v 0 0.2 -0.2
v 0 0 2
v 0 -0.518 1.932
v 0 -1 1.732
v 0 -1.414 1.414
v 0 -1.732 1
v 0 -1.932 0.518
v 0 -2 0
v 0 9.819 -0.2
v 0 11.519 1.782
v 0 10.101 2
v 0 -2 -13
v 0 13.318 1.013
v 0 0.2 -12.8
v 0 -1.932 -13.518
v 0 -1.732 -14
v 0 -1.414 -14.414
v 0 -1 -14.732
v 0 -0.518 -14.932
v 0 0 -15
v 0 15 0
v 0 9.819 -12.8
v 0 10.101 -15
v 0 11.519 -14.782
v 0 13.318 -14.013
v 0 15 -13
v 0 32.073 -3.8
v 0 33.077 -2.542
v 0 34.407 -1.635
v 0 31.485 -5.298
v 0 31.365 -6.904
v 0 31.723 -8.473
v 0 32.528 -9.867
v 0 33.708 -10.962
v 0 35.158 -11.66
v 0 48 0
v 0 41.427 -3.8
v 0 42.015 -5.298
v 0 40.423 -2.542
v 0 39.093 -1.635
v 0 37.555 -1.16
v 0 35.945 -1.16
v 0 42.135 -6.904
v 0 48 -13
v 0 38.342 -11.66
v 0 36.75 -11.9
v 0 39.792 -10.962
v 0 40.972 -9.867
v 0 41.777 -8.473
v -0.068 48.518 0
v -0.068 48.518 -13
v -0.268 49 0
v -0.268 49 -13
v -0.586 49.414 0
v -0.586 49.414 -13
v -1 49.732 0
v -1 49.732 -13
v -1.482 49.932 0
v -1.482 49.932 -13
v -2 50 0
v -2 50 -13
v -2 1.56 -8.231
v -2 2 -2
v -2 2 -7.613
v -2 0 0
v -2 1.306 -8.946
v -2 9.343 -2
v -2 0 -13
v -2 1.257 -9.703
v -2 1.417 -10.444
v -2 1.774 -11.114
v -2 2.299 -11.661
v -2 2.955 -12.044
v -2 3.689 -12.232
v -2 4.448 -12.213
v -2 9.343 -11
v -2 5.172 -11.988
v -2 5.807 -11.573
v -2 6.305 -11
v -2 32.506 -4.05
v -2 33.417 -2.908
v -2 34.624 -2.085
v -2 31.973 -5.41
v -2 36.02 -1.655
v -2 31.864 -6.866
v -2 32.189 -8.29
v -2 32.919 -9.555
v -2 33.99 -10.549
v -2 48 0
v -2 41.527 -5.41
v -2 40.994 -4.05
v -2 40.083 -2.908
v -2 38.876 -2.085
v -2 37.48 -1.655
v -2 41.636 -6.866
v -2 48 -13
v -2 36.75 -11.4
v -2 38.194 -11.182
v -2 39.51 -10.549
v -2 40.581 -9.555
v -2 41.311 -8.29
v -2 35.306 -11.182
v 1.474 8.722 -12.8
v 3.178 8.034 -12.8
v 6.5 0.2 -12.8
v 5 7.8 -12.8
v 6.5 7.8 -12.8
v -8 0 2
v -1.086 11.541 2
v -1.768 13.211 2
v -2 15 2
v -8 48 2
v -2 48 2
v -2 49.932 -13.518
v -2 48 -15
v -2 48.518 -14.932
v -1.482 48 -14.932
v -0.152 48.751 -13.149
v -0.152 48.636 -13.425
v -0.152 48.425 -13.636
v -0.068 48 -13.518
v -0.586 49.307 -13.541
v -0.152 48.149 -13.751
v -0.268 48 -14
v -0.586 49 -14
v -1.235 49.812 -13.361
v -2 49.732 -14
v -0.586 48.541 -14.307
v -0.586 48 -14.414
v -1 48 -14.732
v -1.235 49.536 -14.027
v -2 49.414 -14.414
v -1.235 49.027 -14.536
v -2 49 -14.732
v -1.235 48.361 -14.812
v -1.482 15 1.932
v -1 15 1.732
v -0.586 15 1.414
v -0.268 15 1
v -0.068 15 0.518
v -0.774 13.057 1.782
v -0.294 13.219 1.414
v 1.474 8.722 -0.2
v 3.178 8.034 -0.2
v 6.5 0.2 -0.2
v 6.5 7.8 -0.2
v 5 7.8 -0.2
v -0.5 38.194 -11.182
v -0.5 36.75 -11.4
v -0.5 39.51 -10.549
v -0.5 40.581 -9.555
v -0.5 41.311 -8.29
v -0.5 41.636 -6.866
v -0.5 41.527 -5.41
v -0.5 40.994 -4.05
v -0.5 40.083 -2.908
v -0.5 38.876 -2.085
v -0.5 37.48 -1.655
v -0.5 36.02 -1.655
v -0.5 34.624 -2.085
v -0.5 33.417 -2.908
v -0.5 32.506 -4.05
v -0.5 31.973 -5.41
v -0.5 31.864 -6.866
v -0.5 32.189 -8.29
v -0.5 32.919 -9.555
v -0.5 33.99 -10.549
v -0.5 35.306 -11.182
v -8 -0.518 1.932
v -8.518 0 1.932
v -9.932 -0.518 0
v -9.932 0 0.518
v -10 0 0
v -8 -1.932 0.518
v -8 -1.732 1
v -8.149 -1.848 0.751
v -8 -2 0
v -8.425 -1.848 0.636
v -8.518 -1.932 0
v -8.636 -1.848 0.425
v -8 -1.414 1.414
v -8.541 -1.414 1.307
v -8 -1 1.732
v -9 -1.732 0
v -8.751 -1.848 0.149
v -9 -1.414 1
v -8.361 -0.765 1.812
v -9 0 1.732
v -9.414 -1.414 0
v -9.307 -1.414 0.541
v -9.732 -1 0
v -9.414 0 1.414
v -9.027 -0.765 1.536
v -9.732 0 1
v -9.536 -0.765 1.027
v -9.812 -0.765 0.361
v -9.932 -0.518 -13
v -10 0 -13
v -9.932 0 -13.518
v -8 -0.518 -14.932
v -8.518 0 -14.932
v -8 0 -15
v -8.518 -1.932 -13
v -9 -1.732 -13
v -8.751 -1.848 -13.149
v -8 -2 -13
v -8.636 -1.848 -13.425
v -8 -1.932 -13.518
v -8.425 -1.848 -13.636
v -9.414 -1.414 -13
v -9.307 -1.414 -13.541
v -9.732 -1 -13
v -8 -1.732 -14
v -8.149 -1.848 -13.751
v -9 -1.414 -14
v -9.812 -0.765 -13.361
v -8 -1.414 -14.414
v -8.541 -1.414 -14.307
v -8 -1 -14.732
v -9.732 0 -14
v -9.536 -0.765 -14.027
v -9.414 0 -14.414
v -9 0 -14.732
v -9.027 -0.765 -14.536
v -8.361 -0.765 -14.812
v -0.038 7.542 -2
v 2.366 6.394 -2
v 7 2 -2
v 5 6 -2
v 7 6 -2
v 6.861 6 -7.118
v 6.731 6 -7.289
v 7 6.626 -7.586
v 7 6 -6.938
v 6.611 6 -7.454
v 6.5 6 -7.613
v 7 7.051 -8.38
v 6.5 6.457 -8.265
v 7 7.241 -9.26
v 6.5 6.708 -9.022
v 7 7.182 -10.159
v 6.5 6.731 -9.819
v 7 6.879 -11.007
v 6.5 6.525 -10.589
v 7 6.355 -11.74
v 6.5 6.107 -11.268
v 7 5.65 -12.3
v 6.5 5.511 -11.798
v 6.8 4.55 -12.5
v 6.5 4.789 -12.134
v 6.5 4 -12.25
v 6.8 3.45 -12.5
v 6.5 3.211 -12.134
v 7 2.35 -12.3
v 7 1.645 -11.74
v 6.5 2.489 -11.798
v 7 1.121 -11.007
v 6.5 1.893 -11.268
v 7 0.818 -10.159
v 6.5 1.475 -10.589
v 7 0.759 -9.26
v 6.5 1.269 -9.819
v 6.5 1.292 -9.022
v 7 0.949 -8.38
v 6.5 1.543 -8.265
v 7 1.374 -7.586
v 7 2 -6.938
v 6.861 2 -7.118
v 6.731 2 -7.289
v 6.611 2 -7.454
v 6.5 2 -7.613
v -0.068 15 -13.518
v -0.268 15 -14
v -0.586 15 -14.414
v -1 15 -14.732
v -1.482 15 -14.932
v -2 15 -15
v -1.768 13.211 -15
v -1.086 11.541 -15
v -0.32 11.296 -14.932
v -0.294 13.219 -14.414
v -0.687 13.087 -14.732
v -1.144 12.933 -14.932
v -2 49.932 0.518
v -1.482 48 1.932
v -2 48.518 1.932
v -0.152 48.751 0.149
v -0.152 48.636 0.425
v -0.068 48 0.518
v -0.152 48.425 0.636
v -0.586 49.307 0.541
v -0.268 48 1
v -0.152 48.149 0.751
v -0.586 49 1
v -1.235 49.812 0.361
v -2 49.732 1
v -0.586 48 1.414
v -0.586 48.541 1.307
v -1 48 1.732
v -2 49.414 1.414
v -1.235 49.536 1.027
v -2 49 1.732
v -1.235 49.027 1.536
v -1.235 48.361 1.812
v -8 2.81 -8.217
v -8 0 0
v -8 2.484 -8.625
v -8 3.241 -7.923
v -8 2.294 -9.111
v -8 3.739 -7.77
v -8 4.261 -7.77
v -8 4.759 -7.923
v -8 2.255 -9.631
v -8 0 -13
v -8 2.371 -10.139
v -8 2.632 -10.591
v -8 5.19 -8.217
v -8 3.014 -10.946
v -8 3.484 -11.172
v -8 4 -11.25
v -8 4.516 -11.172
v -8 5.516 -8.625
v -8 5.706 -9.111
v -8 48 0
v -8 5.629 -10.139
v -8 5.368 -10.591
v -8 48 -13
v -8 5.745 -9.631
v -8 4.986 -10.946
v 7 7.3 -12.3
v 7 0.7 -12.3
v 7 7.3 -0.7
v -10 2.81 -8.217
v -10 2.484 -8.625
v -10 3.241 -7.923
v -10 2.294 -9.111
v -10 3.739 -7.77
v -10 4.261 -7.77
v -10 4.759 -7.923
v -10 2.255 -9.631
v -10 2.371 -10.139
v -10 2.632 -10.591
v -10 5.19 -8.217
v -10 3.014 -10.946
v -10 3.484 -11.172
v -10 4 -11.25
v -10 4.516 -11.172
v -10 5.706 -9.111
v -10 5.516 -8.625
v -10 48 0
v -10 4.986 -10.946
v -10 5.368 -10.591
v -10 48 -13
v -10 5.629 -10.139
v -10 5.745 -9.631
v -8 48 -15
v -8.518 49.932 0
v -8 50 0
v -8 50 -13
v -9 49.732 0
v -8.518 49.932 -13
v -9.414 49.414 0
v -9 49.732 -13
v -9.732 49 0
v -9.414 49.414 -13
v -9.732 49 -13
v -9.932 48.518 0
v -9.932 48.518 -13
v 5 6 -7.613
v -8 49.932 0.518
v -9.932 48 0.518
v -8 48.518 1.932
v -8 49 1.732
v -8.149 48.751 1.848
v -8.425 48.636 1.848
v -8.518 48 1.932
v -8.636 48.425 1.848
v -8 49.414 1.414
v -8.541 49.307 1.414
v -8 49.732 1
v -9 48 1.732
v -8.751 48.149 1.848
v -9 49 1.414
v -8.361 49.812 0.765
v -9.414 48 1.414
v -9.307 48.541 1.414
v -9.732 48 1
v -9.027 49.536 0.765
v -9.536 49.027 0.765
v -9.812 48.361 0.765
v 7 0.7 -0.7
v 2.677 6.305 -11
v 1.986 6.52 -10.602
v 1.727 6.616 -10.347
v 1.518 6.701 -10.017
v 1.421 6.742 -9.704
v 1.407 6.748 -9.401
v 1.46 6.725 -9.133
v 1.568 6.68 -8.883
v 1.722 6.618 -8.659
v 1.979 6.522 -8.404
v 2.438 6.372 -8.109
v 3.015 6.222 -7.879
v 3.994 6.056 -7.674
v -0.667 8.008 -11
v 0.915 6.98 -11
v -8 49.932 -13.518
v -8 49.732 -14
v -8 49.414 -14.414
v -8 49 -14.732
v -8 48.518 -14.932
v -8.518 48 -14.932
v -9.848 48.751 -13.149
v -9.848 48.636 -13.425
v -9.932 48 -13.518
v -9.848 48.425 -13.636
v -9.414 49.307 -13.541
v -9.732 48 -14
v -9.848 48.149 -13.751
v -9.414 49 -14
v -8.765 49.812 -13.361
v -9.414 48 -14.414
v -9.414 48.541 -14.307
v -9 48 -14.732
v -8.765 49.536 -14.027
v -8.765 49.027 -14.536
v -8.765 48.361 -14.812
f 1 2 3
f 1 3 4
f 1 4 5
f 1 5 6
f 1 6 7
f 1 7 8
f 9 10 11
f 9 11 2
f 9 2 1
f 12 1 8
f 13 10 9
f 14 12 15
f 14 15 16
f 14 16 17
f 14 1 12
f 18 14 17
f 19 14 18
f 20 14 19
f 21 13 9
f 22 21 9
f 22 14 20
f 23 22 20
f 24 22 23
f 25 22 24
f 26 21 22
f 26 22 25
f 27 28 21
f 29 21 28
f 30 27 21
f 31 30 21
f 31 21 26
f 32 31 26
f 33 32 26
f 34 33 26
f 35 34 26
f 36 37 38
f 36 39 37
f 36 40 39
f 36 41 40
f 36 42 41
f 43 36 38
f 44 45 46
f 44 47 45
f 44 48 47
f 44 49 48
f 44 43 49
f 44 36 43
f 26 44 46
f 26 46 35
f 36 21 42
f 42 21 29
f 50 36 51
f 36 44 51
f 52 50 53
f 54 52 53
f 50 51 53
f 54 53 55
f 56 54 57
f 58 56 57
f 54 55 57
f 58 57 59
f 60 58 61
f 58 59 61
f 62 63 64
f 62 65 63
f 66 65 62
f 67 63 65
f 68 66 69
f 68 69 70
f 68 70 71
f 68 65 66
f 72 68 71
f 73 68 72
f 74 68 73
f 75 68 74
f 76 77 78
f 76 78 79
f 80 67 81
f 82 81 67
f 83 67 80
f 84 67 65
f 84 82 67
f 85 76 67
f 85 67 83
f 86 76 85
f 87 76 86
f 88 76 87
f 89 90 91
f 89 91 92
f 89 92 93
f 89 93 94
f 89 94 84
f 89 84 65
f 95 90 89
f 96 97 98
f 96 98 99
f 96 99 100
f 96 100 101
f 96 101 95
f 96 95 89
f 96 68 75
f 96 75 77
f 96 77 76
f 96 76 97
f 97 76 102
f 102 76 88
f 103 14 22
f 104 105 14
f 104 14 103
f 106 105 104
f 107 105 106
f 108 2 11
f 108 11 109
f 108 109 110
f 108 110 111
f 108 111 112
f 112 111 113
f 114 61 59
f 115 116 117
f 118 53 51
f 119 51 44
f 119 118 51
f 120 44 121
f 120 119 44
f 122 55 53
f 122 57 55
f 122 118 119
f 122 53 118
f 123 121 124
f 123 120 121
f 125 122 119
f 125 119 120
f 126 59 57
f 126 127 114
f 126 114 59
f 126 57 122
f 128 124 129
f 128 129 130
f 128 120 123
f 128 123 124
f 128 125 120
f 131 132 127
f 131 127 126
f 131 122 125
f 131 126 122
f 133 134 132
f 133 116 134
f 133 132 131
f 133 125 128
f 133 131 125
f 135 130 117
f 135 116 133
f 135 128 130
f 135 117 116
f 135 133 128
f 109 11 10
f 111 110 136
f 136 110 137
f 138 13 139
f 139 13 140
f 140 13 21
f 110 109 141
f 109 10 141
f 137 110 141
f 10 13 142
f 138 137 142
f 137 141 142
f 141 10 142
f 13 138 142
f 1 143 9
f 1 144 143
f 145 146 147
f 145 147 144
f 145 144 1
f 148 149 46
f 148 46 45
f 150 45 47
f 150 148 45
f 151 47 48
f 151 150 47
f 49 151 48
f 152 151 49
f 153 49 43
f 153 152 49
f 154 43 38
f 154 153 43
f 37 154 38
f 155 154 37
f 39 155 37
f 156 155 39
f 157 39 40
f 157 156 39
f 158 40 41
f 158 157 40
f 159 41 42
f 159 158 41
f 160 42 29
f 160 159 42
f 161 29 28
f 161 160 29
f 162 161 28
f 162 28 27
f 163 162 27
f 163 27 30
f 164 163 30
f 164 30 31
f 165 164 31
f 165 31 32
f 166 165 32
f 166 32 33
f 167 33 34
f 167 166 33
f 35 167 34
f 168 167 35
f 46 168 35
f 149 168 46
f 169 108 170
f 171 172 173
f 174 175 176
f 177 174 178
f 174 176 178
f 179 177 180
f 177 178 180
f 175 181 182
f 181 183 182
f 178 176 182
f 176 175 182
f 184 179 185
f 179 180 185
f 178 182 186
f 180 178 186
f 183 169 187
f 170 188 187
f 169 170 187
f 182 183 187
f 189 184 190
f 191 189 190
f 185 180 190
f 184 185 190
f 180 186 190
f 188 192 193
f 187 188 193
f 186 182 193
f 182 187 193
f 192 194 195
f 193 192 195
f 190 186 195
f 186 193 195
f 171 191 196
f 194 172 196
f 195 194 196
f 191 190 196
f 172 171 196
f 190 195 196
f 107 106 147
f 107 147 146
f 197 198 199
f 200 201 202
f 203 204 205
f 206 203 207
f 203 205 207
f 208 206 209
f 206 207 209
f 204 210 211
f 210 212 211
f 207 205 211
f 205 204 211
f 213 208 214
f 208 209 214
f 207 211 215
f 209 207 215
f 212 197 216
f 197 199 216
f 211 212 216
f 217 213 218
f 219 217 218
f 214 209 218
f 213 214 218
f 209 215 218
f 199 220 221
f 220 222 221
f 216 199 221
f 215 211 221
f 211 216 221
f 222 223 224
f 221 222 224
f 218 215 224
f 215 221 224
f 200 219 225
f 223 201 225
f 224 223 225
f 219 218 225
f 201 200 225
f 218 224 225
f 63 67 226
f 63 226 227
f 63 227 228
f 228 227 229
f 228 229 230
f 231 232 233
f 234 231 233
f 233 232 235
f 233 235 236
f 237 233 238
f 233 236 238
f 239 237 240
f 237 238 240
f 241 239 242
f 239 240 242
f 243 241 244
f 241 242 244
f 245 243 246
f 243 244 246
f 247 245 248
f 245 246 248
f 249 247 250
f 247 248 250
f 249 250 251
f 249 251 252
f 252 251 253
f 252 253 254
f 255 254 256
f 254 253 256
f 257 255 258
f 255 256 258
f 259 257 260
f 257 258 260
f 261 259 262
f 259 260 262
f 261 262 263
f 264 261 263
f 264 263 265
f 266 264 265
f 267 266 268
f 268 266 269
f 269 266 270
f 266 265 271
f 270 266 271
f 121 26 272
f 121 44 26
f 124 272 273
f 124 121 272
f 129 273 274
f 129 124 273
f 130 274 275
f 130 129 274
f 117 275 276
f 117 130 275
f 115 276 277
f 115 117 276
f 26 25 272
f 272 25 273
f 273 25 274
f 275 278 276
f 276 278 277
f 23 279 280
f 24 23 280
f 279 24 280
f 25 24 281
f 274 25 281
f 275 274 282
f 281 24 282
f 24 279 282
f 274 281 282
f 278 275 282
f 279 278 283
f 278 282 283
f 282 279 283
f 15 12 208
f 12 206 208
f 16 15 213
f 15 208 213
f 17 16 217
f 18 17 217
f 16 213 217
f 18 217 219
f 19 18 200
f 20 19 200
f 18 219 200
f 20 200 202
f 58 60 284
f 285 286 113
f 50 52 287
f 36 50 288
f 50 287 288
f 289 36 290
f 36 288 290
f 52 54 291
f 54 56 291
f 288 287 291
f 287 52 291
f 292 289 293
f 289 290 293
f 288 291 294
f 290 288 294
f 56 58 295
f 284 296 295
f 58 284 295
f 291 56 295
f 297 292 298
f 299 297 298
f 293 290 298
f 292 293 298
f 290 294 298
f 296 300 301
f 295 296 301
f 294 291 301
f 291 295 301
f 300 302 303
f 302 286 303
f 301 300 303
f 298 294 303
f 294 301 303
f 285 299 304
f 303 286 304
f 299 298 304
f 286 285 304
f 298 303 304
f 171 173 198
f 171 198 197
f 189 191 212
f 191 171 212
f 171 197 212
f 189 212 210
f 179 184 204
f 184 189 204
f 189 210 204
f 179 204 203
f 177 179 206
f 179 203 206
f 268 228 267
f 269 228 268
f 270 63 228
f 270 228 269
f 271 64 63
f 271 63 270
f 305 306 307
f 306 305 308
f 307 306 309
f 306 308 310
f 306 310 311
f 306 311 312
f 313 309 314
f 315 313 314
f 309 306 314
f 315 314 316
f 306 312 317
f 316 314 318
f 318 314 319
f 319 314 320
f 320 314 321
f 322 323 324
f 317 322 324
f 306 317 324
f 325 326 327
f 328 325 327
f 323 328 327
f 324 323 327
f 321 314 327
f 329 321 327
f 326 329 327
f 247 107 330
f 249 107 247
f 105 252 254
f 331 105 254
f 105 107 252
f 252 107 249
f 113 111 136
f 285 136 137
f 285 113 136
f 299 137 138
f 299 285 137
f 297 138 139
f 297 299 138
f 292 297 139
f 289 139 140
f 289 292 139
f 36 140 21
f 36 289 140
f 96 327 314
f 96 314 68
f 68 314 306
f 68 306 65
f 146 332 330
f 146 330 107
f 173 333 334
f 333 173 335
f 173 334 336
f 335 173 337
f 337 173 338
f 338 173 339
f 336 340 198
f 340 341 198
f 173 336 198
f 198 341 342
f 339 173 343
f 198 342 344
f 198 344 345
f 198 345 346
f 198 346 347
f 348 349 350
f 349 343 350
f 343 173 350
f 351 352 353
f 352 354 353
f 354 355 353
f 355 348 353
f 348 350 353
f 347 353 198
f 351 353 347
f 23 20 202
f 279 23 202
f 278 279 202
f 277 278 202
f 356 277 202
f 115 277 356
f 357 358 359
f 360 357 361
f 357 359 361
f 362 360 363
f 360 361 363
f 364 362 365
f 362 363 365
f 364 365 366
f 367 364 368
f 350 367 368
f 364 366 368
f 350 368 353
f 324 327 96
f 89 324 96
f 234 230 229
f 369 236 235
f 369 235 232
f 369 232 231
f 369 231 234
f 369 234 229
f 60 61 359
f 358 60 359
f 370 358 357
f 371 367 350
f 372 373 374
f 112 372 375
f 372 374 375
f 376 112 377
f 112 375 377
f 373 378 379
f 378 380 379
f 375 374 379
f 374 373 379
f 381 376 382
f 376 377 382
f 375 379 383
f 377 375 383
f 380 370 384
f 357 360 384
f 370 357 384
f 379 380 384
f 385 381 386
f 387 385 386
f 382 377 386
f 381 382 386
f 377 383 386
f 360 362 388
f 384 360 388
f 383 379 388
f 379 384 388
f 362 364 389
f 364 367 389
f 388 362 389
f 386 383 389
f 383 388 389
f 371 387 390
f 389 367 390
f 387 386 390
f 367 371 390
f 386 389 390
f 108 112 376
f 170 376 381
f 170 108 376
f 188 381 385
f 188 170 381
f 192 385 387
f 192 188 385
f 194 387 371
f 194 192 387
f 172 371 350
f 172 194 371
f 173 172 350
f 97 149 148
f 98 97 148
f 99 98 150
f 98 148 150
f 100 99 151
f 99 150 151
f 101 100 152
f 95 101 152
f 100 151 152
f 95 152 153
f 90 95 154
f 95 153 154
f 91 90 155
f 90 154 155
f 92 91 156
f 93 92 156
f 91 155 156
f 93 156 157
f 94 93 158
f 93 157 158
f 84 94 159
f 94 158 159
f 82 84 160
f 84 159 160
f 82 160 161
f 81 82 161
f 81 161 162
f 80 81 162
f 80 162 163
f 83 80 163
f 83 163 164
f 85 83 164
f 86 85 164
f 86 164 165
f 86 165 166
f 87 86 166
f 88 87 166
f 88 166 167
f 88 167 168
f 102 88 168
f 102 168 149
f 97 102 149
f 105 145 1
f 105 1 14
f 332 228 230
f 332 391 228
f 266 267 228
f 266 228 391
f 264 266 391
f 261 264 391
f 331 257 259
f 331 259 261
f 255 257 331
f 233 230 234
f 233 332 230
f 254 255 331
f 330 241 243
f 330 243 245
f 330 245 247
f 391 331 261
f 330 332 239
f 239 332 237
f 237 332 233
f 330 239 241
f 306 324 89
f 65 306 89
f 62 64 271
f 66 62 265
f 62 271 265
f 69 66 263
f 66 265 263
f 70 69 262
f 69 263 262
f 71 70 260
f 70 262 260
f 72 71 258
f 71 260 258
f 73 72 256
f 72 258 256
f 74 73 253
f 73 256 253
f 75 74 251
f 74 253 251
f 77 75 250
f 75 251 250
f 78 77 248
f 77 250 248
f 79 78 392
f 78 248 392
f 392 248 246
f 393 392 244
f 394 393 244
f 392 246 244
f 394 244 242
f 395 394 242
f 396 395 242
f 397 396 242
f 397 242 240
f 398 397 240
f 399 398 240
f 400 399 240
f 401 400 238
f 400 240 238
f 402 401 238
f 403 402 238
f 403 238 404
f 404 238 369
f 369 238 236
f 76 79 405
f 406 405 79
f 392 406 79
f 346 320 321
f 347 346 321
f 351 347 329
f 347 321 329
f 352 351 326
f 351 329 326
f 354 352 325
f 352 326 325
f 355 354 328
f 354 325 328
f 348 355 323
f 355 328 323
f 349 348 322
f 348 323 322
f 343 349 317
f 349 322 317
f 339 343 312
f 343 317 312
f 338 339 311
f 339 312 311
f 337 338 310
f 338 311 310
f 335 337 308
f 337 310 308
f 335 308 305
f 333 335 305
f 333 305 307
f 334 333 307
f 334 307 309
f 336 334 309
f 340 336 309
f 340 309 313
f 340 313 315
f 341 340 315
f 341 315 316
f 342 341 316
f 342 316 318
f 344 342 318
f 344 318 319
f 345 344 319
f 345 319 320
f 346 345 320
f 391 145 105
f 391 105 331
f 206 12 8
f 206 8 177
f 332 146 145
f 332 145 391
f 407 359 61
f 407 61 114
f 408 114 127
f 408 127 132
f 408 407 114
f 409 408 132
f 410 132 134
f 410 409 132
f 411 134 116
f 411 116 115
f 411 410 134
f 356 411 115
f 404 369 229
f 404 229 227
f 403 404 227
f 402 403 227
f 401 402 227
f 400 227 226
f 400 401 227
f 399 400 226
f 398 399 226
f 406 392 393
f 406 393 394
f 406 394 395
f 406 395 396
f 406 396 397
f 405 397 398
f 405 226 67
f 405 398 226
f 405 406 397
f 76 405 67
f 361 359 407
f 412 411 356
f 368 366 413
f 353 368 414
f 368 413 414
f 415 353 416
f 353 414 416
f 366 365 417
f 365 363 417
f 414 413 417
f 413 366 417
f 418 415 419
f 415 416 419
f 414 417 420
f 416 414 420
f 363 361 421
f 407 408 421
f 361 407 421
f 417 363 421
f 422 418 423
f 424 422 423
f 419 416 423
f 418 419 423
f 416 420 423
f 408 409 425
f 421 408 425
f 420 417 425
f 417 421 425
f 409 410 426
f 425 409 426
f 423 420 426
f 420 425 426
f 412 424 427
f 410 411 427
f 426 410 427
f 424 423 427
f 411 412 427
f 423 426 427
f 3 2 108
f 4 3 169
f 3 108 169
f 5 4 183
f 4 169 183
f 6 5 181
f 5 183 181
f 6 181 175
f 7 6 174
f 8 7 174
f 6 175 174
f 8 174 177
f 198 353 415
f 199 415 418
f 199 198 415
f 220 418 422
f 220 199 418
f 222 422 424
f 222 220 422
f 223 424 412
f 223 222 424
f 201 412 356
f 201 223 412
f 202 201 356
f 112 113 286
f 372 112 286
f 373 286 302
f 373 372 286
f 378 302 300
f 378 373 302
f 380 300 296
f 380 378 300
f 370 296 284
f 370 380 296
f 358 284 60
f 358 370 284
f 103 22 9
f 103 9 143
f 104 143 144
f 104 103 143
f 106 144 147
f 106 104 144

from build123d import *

# Parameters (mm, degrees)
SKETCH1_W                = 13
SKETCH1_H                = 8
BOSS_EXTRUDE1_DEPTH      = 7
BOSS_EXTRUDE2_DEPTH      = 2
BOSS_EXTRUDE2_DEPTH_BACK = 50
SKETCH2_W                = 10
SKETCH2_H                = 17
BOSS_EXTRUDE3_REACH      = 56.9
SKETCH3_W                = 17
SKETCH3_H                = 2
FILLET4_R                = 5
FILLET3_R                = 2
SKETCH4_W                = 17
SKETCH4_H                = 7
CUT_EXTRUDE1_DEPTH       = 7
BOSS_EXTRUDE4_DEPTH      = 13
SHELL1_START             = -13
SHELL1_OUTLINE_W         = 6
SHELL1_OUTLINE_H         = 48
SHELL1_DEPTH             = 13
SHELL1_START_2           = -11
SHELL1_2_DEPTH           = 9
CUT_EXTRUDE2_REACH       = 55.151
SKETCH6_R                = 4.9
CHAMFER1_SIZE            = 0.5
CUT_EXTRUDE3_REACH       = 56.9
SKETCH7_R                = 2.75
SKETCH8_R                = 1.75
CUT_EXTRUDE4_DEPTH       = 55.899908953
CUT_EXTRUDE5_REACH       = 56.9
CUT_EXTRUDE6_START       = -12.6
CUT_EXTRUDE6_DEPTH       = 12.6
CHAMFER2_SIZE            = 0.5


# Read off the part's stored shape, not the designer's step: Shell1
# Some blends are built 0.0001 mm under size
with BuildPart() as part:
    # Sketch1 → Boss-Extrude1 (new body)
    with BuildSketch(Plane(origin=(0, 0, 0), x_dir=(0, 0, -1), z_dir=(1, 0, 0))):
        with Locations((6.5, 4)):
            Rectangle(SKETCH1_W, SKETCH1_H)
    extrude(amount=BOSS_EXTRUDE1_DEPTH)

    # Sketch2 → Boss-Extrude2 (add, two sides: drawn at the far end of the back side and taken through both)
    with BuildSketch(Plane(origin=(0, 0, 0), x_dir=(-1, 0, 0), z_dir=(0, -1, 0)).offset(-BOSS_EXTRUDE2_DEPTH_BACK)):
        with Locations((5, 6.5)):
            Rectangle(SKETCH2_W, SKETCH2_H)
    extrude(amount=BOSS_EXTRUDE2_DEPTH + BOSS_EXTRUDE2_DEPTH_BACK)

    # Sketch3 → Boss-Extrude3 (add, up to next)
    with BuildSketch(Plane(origin=(7, 0, 0), x_dir=(0, 0, -1), z_dir=(1, 0, 0)), mode=Mode.PRIVATE) as boss_extrude3_sk1:
        with Locations((6.5, 9)):
            Rectangle(SKETCH3_W, SKETCH3_H)
    boss_extrude3_tool1 = extrude(boss_extrude3_sk1.sketch, amount=-BOSS_EXTRUDE3_REACH, mode=Mode.PRIVATE) - part.part
    add(boss_extrude3_tool1.solids().sort_by_distance((7, 9, -6.5))[0])

    # Fillet4
    fillet4_edges = [part.edges().sort_by_distance(p)[0] for p in [
        (0, 10, -6.5),
    ]]
    fillet(fillet4_edges, radius=FILLET4_R)

    # Fillet3
    fillet3_edges = [part.edges().sort_by_distance(p)[0] for p in [
        (-5, 50, -15),
        (-10, 50, -6.5),
        (-5, 50, 2),
        (0, 50, -6.5),
        (-10, 24, 2),
        (-5, -2, 2),
        (-10, 24, -15),
        (-10, -2, -6.5),
        (-5, -2, -15),
        (6, 10, -15),
        (1.464466094, 11.464466094, -15),
        (6, 10, 2),
        (1.464466094, 11.464466094, 2),
        (0, 32.5, -15),
        (0, 32.5, 2),
    ]]
    fillet(fillet3_edges, radius=FILLET3_R - 0.0001)  # a hair under: the kernel refuses the full size

    # Sketch4 → Cut-Extrude1 (cut)
    with BuildSketch(Plane(origin=(7, 0, 0), x_dir=(0, 0, -1), z_dir=(1, 0, 0))):
        with Locations((6.5, 11.5)):
            Rectangle(SKETCH4_W, SKETCH4_H)
    extrude(amount=-CUT_EXTRUDE1_DEPTH, mode=Mode.SUBTRACT)

    # Sketch5 → Boss-Extrude4 (add)
    with BuildSketch(Plane(origin=(0, 0, -13), x_dir=(-1, 0, 0), z_dir=(0, 0, -1))):
        with BuildLine():
            Line((0, 8), (-5, 8))
            ThreePointArc((-5, 8), (-2.288252998, 8.546595612), (0, 10.101020514))
            Line((0, 10.101020514), (0, 8))
        make_face()
    extrude(amount=-BOSS_EXTRUDE4_DEPTH)

    # Shell1 outline → Shell1 (cut)
    with BuildSketch(Plane.XY.offset(SHELL1_START)):
        with Locations((-5, 24)):
            Rectangle(SHELL1_OUTLINE_W, SHELL1_OUTLINE_H)
    extrude(amount=SHELL1_DEPTH, mode=Mode.SUBTRACT)

    # Shell1 2 outline → Shell1 2 (cut)
    with BuildSketch(Plane.XY.offset(SHELL1_START_2)):
        with BuildLine():
            Line((-2, 2), (7, 2))
            Line((7, 2), (7, 6))
            Line((7, 6), (5, 6))
            ThreePointArc((5, 6), (1.121320343, 6.878679656), (-2, 9.343145751))
            Line((-2, 9.343145751), (-2, 2))
        make_face()
    extrude(amount=SHELL1_2_DEPTH, mode=Mode.SUBTRACT)

    # Sketch6 → Cut-Extrude2 (cut, up to next)
    with BuildSketch(Plane(origin=(0, 0, 0), x_dir=(0, 0, -1), z_dir=(1, 0, 0)), mode=Mode.PRIVATE) as cut_extrude2_sk1:
        with Locations((6.5, 36.75)):
            Circle(SKETCH6_R)
    cut_extrude2_tool1 = extrude(cut_extrude2_sk1.sketch, amount=-CUT_EXTRUDE2_REACH, mode=Mode.PRIVATE) & part.part
    add(cut_extrude2_tool1.solids().sort_by_distance((0, 36.75, -6.5))[0], mode=Mode.SUBTRACT)

    # Chamfer1
    chamfer1_edges = [part.edges().sort_by_distance(p)[0] for p in [
        (0, 36.75, -1.6),
    ]]
    chamfer(chamfer1_edges, length=CHAMFER1_SIZE)

    # Cut-Extrude3: up to this face of the body (flat: up to its plane)
    cut_extrude3_end = Plane(part.part.faces().sort_by_distance((-8, 24, -6.5))[0])
    # Sketch7 → Cut-Extrude3 (cut, up to the picked face)
    with BuildSketch(Plane(origin=(7, 0, 0), x_dir=(0, 0, -1), z_dir=(1, 0, 0)), mode=Mode.PRIVATE) as cut_extrude3_sk1:
        with Locations((9.5, 4)):
            Circle(SKETCH7_R)
    cut_extrude3_tool1 = split(extrude(cut_extrude3_sk1.sketch, amount=-CUT_EXTRUDE3_REACH, mode=Mode.PRIVATE), bisect_by=cut_extrude3_end, keep=Keep.BOTH, mode=Mode.PRIVATE)
    add(cut_extrude3_tool1.solids().sort_by(Axis((7, 4, -9.5), (-1, 0, 0)))[0], mode=Mode.SUBTRACT)

    # Sketch8 → Cut-Extrude4 (cut, through all)
    with BuildSketch(Plane(origin=(7, 0, 0), x_dir=(0, 0, -1), z_dir=(1, 0, 0))):
        with Locations((9.5, 4)):
            Circle(SKETCH8_R)
    extrude(amount=-CUT_EXTRUDE4_DEPTH, mode=Mode.SUBTRACT)

    # Cut-Extrude5: up to this face of the body (flat: up to its plane)
    cut_extrude5_end = Plane(part.part.faces().sort_by_distance((0, 23.174375266, -6.49999999))[0])
    # Sketch9 → Cut-Extrude5 (cut, up to the picked face)
    with BuildSketch(Plane(origin=(7, 0, 0), x_dir=(0, 0, -1), z_dir=(1, 0, 0)), mode=Mode.PRIVATE) as cut_extrude5_sk1:
        Polygon((0, 10.101020514), (0.2, 10.101020514), (0.2, 0.2), (12.8, 0.2), (12.8, 10.101020514), (13, 10.101020514), (13, 0), (0, 0), align=None)
    cut_extrude5_tool1 = split(extrude(cut_extrude5_sk1.sketch, amount=-CUT_EXTRUDE5_REACH, mode=Mode.PRIVATE), bisect_by=cut_extrude5_end, keep=Keep.BOTH, mode=Mode.PRIVATE)
    add(cut_extrude5_tool1.solids().sort_by(Axis((7, 9.93639, -0.1), (-1, 0, 0)))[0], mode=Mode.SUBTRACT)

    # Sketch10 → Cut-Extrude6 (cut)
    with BuildSketch(Plane.XY.offset(-0.2).offset(CUT_EXTRUDE6_START)):
        with BuildLine():
            Line((7, 8), (5, 8))
            ThreePointArc((5, 8), (2.288252998, 8.546595612), (0, 10.101020514))
            Line((0, 10.101020514), (0, 9.819266461))
            ThreePointArc((0, 9.819266461), (2.303825069, 8.32387532), (5, 7.8))
            Line((5, 7.8), (7, 7.8))
            Line((7, 7.8), (7, 8))
        make_face()
    extrude(amount=CUT_EXTRUDE6_DEPTH, mode=Mode.SUBTRACT)

    # Chamfer2
    # the kernel refuses this chamfer: 0.5 mm, written as the material it takes off along each edge
    with BuildSketch(Plane(origin=(7, 4, -9.5), x_dir=(0, 0.33829869190957257, 0.9410387850945741), z_dir=(0, -0.9410387850945741, 0.33829869190957257))) as chamfer2_piece_1:
        Polygon((2.75 + CHAMFER2_SIZE, 0), (2.75, CHAMFER2_SIZE), (2.75, 0), align=None)
    revolve(axis=Axis((7, 4, -9.5), (-1, 0, 0)), revolution_arc=320.453489915, mode=Mode.SUBTRACT)
    with BuildSketch(Plane(origin=(7, 0.2, 1.085841494), x_dir=(-0.9996219169112968, -0.027495876610586403, 0), z_dir=(0, 0, -1))) as chamfer2_piece_2:
        Polygon((CHAMFER2_SIZE * 0.999621916911, CHAMFER2_SIZE * 0.0274958766106), (-CHAMFER2_SIZE * 0.0274958766106, CHAMFER2_SIZE * 0.999621916911), (0, 0), align=None)
    extrude(amount=15.171682988, mode=Mode.SUBTRACT)
    with BuildSketch(Plane(origin=(7, 9.085841494, -0.2), x_dir=(-0.9996219169112968, 0, 0.027495876610586403), z_dir=(0, -1, 0)), Plane(origin=(7, -1.085841494, -12.8), x_dir=(-0.9996219169112968, 0, -0.027495876610585647), z_dir=(0, 1, 0))) as chamfer2_piece_3:
        Polygon((CHAMFER2_SIZE * 0.999621916911, CHAMFER2_SIZE * 0.0274958766106), (-CHAMFER2_SIZE * 0.0274958766106, CHAMFER2_SIZE * 0.999621916911), (0, 0), align=None)
    extrude(amount=10.171682988, mode=Mode.SUBTRACT)
    with BuildSketch(Plane(origin=(7, 7.8, -14.085841494), x_dir=(0.027495876610585647, -0.9996219169112968, 0), z_dir=(0, 0, 1))) as chamfer2_piece_4:
        Polygon((CHAMFER2_SIZE * 0.999621916911, -CHAMFER2_SIZE * 0.0274958766106), (-CHAMFER2_SIZE * 0.0274958766106, -CHAMFER2_SIZE * 0.999621916911), (0, 0), align=None)
    extrude(amount=15.171682988, mode=Mode.SUBTRACT)


solid = part.part
